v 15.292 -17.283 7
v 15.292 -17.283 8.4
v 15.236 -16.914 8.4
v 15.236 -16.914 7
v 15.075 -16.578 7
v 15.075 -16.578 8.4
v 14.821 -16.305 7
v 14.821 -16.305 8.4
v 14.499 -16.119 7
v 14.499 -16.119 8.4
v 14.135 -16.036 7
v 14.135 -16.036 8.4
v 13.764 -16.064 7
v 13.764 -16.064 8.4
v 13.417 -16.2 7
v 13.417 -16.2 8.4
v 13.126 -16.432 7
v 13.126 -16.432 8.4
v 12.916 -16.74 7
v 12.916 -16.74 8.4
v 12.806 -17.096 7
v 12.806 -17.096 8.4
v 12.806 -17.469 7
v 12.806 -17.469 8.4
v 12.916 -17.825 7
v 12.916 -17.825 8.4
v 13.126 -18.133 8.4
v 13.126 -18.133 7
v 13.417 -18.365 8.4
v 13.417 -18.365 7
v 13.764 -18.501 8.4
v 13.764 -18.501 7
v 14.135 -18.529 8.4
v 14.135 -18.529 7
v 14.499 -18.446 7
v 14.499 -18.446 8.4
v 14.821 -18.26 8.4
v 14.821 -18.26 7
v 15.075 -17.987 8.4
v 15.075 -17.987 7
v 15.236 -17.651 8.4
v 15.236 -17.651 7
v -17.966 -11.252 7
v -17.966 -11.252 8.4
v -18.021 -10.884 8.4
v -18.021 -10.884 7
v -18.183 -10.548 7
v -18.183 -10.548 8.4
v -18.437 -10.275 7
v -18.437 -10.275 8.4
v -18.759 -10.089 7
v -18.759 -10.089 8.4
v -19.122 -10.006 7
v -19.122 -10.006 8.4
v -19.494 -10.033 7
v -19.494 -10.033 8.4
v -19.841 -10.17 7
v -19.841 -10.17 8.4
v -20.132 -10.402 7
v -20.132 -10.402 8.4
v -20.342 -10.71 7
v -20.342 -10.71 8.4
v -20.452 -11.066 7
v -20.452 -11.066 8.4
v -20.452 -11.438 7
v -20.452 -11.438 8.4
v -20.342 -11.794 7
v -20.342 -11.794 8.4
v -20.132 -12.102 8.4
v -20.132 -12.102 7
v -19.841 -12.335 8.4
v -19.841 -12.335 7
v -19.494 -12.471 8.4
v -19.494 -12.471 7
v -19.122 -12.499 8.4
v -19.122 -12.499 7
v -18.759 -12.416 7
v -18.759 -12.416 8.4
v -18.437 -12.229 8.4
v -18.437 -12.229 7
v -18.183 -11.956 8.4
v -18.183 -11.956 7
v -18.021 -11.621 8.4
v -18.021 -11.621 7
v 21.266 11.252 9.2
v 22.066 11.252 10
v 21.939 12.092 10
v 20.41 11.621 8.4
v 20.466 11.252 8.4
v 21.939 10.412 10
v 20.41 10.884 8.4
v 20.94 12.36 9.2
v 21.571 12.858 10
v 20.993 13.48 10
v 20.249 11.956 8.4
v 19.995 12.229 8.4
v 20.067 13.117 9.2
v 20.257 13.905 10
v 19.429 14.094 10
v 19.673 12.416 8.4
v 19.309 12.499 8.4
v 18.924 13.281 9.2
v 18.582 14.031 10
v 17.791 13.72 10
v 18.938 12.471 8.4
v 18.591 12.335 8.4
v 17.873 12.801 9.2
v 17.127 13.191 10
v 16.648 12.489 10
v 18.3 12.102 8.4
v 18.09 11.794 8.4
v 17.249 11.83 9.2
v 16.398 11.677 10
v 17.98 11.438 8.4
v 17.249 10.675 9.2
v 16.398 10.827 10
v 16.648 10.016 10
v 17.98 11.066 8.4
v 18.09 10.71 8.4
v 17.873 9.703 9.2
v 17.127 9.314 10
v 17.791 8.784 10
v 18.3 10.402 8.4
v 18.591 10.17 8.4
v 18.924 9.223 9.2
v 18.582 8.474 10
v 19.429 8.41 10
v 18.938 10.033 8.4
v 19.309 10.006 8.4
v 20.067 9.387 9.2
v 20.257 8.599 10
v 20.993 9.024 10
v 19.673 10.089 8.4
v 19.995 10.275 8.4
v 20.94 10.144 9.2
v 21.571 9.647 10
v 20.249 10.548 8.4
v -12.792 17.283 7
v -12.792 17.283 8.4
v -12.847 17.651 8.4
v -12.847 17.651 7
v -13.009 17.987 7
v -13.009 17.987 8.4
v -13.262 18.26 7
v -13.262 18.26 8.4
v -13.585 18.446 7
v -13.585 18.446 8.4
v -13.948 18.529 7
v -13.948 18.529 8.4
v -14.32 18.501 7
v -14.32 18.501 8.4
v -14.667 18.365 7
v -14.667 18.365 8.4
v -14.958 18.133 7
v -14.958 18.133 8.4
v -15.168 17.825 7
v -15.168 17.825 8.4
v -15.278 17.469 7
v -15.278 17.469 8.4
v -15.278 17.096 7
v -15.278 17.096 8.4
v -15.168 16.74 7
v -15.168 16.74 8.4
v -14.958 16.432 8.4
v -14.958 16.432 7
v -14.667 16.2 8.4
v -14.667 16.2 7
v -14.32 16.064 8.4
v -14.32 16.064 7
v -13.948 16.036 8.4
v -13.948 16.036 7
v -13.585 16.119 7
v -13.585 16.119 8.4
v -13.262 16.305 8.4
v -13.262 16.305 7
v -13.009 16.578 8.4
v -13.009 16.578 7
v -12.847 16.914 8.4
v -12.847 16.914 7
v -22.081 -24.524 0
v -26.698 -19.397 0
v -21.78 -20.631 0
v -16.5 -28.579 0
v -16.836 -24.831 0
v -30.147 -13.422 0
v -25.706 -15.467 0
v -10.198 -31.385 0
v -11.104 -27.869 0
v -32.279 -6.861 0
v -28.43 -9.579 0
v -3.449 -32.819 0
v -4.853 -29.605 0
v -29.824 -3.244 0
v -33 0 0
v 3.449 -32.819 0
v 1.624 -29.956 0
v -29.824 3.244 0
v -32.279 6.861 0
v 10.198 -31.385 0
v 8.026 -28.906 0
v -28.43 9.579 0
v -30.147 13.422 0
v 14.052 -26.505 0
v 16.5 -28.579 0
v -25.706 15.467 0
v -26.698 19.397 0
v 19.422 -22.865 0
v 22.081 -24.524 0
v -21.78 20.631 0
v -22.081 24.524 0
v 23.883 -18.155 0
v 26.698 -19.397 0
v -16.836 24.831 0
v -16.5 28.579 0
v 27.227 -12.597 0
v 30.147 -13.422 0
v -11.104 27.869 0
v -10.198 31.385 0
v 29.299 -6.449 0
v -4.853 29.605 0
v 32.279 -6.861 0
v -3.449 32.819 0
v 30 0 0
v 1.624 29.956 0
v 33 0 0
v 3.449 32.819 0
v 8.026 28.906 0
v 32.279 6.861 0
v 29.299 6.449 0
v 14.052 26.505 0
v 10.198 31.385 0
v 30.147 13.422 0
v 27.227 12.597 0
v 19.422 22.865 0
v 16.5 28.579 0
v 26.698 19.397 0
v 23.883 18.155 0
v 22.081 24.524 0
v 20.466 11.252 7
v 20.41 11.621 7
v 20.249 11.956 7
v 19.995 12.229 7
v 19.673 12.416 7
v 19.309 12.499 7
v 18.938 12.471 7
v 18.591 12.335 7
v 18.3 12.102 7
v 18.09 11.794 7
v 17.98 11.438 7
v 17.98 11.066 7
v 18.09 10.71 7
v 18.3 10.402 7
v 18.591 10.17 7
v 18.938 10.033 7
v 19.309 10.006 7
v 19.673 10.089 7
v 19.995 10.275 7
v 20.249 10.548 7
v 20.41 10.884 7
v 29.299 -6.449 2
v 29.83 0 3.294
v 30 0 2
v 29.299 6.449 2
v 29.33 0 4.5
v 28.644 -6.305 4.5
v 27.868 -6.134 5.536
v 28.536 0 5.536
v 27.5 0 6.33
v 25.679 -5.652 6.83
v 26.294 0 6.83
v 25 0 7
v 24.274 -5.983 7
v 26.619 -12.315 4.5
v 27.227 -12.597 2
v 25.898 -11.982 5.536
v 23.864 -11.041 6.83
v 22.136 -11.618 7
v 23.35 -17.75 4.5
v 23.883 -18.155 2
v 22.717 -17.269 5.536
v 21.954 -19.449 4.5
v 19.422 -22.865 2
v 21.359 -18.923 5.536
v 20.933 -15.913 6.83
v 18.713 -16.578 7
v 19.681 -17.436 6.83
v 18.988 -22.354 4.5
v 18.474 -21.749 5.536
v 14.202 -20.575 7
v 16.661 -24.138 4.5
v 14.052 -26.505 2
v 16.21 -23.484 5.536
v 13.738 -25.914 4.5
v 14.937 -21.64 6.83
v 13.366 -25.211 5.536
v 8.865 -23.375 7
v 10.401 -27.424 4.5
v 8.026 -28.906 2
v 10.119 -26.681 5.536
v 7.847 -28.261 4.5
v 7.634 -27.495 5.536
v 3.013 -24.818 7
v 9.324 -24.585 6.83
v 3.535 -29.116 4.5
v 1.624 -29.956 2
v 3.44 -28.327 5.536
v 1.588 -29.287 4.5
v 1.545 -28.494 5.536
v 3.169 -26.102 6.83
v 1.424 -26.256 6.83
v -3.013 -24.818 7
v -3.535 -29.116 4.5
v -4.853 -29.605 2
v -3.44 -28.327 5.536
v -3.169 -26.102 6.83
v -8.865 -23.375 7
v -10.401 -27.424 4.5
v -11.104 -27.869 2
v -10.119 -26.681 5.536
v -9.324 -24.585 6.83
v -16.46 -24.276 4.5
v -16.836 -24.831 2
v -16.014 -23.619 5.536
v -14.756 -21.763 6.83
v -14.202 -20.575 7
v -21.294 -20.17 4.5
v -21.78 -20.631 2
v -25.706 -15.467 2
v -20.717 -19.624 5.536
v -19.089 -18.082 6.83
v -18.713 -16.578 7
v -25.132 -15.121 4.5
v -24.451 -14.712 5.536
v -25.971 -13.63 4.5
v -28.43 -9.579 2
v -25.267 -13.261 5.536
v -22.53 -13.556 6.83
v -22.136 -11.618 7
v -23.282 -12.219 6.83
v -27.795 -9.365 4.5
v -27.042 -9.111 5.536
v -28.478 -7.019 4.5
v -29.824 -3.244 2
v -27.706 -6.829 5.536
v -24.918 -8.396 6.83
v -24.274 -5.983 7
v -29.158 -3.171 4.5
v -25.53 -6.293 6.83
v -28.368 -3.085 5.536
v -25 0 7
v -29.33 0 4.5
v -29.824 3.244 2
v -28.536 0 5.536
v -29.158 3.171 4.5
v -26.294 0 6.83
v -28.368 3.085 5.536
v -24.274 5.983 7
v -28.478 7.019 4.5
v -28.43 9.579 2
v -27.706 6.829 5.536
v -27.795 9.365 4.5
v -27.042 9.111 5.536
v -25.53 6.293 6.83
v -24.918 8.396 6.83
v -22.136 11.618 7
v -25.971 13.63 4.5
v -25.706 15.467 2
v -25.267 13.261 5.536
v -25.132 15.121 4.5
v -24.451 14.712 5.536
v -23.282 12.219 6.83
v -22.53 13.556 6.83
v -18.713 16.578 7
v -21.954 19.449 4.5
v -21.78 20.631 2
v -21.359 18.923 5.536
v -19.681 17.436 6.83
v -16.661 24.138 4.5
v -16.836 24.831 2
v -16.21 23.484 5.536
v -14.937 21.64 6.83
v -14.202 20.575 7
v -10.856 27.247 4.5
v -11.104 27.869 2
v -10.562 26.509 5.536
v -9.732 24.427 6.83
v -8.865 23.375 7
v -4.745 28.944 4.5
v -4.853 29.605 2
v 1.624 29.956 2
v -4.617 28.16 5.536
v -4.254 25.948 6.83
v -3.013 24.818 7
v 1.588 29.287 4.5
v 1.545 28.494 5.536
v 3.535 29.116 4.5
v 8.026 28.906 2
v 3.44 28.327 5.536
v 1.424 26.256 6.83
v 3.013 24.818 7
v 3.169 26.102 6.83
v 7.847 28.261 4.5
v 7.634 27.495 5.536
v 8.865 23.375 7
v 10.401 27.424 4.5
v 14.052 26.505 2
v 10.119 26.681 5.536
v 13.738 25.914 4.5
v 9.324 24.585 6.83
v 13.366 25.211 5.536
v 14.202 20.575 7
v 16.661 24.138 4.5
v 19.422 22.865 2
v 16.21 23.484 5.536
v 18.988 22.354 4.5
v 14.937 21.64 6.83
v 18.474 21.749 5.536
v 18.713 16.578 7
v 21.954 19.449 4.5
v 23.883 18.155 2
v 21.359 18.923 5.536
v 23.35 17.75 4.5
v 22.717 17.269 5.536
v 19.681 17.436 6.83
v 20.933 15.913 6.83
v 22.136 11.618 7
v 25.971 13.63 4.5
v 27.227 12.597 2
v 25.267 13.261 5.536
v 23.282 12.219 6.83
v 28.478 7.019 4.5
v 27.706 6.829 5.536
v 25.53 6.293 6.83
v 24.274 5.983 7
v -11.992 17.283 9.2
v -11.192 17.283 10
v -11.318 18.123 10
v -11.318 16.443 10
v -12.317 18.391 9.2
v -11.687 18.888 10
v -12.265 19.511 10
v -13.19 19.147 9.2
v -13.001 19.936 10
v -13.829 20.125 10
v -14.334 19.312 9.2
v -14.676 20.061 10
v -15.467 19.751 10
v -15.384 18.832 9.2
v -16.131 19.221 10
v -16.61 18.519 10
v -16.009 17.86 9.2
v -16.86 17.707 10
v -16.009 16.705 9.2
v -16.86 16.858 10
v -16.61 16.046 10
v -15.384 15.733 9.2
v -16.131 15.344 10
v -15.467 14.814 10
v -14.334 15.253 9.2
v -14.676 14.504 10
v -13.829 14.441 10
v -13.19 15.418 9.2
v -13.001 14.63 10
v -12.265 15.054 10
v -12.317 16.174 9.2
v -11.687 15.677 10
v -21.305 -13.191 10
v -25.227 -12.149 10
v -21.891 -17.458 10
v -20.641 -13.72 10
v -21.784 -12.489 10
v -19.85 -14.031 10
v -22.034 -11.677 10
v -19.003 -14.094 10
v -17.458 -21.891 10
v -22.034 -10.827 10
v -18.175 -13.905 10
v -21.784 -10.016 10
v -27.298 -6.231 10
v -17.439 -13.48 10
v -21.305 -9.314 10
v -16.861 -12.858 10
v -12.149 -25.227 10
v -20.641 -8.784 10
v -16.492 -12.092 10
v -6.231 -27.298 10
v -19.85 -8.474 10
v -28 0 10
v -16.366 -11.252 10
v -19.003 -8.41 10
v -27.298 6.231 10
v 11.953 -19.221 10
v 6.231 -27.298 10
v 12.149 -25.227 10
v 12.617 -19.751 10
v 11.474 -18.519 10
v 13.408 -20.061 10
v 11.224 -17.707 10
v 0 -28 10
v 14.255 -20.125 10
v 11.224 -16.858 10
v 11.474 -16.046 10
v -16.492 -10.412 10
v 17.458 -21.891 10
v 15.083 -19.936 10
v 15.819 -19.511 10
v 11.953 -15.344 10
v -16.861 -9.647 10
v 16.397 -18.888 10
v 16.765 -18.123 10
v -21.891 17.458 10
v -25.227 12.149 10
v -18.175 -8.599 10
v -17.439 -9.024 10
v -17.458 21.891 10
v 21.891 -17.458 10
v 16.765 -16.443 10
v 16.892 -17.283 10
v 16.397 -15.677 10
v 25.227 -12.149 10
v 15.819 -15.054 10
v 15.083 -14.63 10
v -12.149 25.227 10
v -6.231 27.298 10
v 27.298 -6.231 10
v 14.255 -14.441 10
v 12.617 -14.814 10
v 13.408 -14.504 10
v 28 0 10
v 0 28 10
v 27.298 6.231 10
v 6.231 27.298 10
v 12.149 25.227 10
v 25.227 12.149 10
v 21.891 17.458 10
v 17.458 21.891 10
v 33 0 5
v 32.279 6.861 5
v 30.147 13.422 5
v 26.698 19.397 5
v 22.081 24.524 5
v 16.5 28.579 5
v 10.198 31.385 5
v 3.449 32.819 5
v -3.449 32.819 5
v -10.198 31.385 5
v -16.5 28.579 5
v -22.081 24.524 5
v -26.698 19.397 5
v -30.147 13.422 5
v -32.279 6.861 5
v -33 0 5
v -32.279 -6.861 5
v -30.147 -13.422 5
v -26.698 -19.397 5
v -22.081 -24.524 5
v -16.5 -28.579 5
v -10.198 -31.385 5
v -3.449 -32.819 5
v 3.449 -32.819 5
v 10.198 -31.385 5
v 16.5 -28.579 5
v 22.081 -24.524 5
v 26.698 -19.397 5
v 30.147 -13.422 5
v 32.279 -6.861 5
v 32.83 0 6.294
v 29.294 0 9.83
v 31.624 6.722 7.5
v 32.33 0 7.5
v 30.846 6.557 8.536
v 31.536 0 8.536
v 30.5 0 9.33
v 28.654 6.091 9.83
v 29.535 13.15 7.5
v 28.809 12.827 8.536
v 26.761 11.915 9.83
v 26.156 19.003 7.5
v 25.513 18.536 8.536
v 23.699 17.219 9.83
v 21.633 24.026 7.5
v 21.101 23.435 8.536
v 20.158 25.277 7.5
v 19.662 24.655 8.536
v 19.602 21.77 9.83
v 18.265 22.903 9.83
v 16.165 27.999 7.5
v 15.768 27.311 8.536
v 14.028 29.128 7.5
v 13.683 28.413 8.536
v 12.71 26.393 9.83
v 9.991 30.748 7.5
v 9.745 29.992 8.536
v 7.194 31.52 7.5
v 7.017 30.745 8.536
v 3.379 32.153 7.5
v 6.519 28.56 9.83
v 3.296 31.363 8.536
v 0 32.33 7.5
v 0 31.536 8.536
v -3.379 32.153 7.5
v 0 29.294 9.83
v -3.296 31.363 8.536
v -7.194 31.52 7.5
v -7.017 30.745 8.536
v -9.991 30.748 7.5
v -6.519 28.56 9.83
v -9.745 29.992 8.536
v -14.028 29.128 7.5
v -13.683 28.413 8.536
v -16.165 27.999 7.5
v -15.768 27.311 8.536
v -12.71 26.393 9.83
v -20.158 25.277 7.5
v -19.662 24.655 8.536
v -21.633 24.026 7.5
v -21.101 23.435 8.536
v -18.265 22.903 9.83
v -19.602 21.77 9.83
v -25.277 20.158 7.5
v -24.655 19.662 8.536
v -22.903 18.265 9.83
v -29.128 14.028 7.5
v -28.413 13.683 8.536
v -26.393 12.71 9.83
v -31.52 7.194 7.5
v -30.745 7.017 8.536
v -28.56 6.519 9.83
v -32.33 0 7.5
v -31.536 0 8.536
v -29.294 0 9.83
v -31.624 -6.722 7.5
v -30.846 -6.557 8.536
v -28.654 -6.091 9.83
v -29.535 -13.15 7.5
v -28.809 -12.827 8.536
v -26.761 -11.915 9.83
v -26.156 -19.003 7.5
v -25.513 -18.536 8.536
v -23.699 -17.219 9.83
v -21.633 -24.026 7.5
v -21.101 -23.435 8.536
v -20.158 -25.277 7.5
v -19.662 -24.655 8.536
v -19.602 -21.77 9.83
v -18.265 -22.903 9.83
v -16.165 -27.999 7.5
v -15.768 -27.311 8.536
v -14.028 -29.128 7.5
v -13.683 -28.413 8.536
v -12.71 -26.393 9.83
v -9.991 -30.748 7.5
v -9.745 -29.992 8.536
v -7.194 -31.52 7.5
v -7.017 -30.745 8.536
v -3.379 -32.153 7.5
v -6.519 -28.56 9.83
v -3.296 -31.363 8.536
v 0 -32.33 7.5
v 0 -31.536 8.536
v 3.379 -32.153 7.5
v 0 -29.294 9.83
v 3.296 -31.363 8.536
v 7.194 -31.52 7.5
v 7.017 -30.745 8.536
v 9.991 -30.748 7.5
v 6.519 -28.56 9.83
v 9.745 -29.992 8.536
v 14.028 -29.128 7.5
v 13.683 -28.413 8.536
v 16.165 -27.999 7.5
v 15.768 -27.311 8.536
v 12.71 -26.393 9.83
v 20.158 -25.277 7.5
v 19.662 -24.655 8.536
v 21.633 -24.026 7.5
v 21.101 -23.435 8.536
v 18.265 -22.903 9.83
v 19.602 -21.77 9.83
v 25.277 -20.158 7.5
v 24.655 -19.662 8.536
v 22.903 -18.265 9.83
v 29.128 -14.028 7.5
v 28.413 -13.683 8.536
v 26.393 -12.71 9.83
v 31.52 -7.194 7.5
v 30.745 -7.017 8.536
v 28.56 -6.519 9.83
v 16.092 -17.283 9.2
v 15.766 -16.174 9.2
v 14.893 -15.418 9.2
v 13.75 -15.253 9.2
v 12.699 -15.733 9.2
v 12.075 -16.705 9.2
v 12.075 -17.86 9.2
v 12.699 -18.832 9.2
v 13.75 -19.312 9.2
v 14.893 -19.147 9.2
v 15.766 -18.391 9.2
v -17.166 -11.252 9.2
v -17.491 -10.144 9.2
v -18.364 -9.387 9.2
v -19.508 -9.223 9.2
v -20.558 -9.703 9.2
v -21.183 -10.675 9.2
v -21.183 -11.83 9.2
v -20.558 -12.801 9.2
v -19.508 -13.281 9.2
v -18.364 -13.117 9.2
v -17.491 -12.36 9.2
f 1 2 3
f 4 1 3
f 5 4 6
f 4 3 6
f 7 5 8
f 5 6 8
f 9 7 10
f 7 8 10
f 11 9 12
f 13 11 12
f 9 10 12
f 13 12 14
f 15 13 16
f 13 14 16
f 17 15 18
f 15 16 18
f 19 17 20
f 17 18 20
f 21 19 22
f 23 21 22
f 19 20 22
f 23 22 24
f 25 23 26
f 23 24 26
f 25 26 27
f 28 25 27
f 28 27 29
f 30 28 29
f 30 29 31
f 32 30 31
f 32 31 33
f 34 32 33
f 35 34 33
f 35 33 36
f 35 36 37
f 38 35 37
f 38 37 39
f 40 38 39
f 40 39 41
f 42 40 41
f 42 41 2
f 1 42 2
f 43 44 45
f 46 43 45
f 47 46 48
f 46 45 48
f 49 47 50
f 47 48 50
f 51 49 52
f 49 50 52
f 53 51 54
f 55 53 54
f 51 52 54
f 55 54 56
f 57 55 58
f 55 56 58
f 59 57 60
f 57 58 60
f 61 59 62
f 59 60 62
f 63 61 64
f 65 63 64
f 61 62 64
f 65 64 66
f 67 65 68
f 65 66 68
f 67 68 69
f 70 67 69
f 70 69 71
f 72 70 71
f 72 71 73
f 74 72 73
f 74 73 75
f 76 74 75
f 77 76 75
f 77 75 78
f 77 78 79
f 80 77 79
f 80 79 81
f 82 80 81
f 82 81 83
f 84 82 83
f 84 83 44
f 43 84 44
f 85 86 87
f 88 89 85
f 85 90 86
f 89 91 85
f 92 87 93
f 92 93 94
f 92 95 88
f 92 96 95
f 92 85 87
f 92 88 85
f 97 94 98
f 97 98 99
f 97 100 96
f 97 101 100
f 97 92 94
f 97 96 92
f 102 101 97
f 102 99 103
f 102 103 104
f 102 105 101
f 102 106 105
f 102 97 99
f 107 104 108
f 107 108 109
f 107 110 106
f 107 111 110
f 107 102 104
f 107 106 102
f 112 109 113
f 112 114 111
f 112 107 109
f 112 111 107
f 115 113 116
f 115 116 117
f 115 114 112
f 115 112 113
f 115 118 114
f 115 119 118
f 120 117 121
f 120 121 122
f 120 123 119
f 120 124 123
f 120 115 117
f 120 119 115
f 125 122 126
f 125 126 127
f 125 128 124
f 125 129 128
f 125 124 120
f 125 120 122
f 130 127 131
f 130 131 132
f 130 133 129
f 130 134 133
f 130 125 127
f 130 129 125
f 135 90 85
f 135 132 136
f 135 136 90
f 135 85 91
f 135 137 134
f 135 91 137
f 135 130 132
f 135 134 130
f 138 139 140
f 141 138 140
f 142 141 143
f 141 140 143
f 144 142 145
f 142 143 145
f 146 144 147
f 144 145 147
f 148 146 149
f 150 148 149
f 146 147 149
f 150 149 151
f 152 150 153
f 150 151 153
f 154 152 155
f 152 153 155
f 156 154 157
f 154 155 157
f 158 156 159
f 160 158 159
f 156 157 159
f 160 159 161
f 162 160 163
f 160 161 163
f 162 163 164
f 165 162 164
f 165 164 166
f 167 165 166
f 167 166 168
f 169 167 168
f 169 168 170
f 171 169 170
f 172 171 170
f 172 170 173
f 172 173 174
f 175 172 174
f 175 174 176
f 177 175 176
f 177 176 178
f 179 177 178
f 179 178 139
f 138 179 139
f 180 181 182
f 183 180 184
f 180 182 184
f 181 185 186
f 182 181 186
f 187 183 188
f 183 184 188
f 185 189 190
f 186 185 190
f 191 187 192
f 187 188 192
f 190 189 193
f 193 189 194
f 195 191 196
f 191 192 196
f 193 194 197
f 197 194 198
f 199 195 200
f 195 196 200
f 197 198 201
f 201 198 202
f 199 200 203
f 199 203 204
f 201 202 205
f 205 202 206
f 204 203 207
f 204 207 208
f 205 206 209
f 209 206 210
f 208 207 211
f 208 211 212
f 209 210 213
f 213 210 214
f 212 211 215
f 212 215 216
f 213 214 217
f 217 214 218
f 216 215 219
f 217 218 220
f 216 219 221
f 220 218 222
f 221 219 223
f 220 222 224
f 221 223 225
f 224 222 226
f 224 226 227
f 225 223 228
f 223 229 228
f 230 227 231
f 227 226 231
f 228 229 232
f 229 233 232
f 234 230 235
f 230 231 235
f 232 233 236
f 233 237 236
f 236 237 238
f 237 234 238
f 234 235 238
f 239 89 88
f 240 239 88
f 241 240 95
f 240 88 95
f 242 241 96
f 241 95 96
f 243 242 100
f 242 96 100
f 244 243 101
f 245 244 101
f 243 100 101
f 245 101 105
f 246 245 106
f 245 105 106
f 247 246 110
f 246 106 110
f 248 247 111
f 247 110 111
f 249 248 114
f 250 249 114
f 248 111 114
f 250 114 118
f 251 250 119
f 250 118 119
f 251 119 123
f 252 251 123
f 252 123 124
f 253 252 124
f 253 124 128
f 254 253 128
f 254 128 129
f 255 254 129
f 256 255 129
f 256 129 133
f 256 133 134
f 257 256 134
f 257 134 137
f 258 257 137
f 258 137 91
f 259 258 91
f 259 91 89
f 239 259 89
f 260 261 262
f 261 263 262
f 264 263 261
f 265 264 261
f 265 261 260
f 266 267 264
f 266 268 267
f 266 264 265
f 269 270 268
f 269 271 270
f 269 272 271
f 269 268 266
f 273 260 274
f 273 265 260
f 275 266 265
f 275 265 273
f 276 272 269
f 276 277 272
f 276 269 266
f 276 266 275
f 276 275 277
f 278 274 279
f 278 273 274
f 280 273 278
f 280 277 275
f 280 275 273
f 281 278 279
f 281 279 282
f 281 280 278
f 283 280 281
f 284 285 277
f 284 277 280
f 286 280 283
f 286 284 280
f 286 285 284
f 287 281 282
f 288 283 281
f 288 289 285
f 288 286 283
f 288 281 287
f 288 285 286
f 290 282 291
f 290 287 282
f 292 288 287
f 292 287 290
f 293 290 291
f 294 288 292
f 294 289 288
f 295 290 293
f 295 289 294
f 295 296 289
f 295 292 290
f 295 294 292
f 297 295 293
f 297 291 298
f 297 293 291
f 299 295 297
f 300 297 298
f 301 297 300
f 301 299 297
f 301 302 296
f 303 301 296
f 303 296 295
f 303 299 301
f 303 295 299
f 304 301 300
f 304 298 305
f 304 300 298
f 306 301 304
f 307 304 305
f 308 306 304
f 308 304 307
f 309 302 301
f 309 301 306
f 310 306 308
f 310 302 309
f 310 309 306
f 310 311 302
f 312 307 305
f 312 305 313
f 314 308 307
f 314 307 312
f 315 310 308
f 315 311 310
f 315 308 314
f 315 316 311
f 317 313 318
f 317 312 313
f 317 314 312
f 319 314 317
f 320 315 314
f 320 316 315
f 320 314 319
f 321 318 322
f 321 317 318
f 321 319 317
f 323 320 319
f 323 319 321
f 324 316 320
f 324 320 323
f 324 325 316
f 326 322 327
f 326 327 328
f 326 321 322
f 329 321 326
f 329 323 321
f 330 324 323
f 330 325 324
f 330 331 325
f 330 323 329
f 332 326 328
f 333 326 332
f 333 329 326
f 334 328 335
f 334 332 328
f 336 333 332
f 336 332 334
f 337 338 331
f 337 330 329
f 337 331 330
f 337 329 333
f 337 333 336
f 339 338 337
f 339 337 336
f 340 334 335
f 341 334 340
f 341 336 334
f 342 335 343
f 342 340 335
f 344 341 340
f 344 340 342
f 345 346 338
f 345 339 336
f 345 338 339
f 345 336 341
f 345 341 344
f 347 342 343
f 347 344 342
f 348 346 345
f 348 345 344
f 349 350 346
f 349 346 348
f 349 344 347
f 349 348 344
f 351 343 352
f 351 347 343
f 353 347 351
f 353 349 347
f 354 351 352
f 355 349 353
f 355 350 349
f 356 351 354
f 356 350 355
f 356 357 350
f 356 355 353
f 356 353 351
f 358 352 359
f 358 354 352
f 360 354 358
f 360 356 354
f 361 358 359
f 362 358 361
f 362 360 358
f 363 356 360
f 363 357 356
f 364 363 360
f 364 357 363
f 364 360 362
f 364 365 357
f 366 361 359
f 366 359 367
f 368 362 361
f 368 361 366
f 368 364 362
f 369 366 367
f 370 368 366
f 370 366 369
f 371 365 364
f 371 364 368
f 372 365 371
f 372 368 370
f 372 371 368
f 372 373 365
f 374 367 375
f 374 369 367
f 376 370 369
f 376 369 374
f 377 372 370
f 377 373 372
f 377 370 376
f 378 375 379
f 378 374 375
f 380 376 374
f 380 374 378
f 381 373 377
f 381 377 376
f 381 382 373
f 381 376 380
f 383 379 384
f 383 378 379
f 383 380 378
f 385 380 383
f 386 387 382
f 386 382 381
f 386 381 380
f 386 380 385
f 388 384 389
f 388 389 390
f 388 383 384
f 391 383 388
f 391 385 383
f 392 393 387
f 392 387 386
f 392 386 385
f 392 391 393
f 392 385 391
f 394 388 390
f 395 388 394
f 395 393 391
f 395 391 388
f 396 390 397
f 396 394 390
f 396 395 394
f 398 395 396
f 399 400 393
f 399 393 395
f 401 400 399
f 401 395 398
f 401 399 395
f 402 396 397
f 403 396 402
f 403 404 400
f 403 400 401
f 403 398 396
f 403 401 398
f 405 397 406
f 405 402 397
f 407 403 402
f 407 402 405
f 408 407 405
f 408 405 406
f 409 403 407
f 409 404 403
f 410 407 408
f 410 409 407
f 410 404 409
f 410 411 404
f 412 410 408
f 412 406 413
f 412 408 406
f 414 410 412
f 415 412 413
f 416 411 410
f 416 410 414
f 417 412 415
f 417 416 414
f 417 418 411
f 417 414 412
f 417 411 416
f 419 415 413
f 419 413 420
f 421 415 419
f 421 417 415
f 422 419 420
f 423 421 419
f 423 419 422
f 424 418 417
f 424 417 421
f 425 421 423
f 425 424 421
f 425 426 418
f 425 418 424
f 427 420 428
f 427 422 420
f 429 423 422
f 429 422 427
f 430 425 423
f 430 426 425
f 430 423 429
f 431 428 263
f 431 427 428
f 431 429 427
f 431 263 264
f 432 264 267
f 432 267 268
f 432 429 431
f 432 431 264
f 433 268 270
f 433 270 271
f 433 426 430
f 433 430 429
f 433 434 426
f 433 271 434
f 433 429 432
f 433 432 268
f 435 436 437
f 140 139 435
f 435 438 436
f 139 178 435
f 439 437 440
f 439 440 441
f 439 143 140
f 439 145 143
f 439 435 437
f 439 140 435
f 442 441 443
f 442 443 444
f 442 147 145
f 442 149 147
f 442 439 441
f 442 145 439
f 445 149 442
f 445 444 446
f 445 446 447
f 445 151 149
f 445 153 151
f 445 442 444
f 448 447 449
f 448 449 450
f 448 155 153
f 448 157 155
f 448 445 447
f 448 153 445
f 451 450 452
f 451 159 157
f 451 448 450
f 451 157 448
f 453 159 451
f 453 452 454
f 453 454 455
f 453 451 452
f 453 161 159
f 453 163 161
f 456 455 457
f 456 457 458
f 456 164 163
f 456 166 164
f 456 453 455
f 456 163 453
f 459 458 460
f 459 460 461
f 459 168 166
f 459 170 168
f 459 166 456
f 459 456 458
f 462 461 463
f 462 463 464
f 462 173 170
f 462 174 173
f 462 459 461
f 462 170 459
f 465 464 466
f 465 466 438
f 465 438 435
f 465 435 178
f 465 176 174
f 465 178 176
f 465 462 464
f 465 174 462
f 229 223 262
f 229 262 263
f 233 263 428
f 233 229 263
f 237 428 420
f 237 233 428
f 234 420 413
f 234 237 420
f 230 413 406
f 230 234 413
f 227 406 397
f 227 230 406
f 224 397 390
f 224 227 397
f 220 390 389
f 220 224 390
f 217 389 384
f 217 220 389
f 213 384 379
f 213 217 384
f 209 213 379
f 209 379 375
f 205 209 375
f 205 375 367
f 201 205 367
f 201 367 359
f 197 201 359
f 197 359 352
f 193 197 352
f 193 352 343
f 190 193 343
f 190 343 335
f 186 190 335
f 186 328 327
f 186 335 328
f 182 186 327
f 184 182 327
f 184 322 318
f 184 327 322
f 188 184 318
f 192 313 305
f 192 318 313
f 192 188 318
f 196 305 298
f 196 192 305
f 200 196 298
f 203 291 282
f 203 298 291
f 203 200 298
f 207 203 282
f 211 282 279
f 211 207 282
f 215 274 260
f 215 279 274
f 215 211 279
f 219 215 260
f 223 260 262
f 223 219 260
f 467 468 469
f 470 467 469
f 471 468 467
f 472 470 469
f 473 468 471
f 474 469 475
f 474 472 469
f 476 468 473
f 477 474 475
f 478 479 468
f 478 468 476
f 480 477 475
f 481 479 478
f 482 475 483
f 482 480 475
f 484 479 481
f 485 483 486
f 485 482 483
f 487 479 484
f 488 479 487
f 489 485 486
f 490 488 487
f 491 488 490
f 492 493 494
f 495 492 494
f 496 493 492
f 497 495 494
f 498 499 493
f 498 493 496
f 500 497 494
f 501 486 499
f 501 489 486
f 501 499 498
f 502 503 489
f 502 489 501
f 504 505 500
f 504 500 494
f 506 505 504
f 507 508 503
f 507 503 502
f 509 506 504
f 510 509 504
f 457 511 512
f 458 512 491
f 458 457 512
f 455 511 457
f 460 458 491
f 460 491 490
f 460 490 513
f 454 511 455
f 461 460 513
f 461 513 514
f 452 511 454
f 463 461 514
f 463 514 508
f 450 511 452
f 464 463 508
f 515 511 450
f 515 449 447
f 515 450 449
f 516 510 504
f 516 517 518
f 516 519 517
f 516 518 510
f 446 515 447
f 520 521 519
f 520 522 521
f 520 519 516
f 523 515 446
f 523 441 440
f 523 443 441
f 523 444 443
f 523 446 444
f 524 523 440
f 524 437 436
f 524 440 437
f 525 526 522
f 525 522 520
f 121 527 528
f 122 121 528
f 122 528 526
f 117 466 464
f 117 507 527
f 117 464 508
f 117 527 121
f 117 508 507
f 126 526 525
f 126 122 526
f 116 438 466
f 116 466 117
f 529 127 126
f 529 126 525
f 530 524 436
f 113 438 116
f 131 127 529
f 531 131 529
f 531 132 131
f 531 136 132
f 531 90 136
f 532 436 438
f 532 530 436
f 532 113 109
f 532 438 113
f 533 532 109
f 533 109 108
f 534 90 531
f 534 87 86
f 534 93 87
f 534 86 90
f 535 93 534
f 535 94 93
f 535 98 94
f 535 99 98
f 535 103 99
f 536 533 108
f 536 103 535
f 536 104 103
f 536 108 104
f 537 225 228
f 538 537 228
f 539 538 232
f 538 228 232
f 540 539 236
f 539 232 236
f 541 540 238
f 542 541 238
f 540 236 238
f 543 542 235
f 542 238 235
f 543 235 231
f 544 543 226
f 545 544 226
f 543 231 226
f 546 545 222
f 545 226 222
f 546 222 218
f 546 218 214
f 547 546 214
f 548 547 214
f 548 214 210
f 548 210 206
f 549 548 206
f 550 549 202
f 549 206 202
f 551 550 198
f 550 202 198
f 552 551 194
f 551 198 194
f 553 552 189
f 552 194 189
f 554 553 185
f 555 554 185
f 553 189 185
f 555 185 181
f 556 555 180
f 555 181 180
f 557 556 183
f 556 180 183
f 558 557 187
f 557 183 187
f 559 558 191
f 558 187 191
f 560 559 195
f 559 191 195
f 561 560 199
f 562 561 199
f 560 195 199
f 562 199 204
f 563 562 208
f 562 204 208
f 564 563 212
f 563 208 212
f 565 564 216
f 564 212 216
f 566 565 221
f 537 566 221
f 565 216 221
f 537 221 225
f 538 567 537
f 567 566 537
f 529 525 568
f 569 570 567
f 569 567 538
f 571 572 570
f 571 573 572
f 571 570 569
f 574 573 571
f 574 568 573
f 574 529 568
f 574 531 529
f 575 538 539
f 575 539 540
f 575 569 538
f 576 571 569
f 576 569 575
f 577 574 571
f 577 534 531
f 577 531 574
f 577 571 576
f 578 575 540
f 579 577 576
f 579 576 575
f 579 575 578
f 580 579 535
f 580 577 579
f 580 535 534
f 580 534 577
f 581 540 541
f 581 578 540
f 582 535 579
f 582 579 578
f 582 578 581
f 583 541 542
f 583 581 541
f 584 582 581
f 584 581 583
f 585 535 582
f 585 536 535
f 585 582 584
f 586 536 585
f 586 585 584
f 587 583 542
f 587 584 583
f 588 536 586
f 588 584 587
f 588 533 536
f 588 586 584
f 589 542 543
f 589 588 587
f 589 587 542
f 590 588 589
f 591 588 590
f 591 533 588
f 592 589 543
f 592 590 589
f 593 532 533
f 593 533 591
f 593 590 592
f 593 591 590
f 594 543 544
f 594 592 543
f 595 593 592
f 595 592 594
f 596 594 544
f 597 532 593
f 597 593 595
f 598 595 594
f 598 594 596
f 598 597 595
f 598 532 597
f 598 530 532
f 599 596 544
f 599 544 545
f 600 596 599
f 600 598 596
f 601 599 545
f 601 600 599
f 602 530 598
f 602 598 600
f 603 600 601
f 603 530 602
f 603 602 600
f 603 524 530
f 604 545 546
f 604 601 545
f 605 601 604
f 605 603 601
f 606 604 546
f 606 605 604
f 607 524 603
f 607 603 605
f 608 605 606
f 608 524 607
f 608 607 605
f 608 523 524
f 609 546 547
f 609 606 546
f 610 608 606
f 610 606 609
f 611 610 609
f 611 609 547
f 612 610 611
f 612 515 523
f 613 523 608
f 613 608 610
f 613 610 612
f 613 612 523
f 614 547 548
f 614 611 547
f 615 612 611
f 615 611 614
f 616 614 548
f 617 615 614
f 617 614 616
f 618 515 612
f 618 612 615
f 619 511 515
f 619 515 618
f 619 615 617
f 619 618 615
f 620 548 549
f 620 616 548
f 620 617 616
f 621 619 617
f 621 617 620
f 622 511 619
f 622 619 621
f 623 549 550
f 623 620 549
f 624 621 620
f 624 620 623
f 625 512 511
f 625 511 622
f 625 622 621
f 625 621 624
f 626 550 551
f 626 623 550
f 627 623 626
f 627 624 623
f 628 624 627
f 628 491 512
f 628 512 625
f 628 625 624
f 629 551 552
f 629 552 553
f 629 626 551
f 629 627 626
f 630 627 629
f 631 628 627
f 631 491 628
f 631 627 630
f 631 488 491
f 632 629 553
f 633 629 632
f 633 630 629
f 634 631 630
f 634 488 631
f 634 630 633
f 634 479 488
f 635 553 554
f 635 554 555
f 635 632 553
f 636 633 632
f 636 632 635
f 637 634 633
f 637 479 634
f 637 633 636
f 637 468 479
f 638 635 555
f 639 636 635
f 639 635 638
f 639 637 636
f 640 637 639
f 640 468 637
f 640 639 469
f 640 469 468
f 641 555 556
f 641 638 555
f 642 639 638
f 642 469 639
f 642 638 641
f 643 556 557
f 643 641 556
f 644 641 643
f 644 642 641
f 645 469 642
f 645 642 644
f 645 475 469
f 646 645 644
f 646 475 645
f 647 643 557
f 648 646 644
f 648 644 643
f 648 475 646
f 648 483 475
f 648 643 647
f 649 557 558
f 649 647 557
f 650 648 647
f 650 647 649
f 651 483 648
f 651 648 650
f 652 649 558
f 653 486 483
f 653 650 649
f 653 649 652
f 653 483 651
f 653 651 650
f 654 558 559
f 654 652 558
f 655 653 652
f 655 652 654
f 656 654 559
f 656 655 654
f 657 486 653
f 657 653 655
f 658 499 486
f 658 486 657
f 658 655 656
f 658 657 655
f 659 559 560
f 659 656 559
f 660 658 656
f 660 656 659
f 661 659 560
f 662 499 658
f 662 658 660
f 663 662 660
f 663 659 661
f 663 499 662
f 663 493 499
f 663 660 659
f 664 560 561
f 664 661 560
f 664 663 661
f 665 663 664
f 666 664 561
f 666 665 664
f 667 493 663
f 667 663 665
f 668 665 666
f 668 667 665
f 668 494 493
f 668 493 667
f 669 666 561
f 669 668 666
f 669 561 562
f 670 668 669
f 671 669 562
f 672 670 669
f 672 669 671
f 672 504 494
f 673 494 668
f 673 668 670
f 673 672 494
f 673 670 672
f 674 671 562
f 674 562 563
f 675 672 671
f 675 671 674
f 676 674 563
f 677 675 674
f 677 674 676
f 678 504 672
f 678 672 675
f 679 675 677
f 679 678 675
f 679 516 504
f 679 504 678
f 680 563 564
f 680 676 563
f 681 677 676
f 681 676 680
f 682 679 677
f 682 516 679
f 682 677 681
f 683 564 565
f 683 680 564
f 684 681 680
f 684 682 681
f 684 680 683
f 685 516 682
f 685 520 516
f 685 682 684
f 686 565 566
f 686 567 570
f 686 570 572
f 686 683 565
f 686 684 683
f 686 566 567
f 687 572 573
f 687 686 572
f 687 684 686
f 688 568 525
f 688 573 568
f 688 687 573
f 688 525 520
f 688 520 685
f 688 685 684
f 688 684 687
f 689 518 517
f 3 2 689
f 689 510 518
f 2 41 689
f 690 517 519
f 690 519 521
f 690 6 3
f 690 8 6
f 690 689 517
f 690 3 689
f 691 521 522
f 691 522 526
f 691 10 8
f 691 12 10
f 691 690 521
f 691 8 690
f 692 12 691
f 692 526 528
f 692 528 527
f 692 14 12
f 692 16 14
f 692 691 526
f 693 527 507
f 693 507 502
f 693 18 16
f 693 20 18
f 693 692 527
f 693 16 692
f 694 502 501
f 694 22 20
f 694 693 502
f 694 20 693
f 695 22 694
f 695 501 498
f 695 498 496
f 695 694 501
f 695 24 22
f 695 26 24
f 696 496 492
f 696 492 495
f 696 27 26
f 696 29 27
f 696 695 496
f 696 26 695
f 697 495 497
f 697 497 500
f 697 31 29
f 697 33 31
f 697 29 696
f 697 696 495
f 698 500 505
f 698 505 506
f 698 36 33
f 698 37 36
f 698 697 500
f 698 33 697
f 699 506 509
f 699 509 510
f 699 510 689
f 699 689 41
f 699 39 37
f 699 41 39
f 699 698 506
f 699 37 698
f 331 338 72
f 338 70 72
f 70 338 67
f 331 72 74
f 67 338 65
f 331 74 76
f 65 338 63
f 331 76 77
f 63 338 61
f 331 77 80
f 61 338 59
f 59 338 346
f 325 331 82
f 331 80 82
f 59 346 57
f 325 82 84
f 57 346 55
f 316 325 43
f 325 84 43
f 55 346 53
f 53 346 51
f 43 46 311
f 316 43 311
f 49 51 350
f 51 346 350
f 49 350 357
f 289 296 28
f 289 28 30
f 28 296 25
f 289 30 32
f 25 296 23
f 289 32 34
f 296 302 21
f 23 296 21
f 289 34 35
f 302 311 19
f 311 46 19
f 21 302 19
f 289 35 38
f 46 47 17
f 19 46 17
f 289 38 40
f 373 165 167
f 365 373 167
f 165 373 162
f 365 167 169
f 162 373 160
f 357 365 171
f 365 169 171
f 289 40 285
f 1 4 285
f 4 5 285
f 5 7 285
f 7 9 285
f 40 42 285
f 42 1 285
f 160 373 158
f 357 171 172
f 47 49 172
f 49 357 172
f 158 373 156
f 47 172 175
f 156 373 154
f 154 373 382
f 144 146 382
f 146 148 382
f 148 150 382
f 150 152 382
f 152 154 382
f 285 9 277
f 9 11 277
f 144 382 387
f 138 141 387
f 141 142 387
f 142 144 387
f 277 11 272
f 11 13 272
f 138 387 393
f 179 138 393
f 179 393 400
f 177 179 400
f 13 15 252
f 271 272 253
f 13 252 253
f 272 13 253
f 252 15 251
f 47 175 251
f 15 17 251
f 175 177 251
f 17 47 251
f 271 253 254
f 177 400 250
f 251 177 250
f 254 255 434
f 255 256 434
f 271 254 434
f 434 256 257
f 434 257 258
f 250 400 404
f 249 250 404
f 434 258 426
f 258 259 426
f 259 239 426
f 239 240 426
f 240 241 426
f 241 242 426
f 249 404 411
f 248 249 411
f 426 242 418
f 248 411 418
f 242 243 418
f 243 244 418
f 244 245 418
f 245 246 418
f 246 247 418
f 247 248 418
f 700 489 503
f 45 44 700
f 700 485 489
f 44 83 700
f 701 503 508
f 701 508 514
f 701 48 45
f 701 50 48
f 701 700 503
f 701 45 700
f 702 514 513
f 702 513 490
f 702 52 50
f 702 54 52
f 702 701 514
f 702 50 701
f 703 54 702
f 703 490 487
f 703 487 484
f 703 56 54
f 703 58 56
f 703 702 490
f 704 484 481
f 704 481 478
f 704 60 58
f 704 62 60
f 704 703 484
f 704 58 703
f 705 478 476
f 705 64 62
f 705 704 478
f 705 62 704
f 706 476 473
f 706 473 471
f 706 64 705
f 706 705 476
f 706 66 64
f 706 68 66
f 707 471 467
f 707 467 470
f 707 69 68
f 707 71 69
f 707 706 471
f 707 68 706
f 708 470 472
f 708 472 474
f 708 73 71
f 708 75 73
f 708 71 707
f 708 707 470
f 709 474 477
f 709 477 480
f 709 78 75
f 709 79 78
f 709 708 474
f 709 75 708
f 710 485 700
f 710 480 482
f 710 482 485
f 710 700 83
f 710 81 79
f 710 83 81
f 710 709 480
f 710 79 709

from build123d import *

# Parameters (mm, degrees)
CROQUIS1_R              = 33
SALIENTE_EXTRUIR1_DEPTH = 10
VACIADO1_T              = -3
REDONDEO1_R             = 5
CORTAR_EXTRUIR1_REACH   = 49.728
CROQUIS2_R              = 1.25
CHAFL_N1_SIZE           = 1.6


with BuildPart() as part:
    # Croquis1 → Saliente-Extruir1 (new body)
    with BuildSketch(Plane.XY):
        Circle(CROQUIS1_R)
    extrude(amount=SALIENTE_EXTRUIR1_DEPTH)

    # Vaciado1
    vaciado1_openings = [part.faces().sort_by_distance(p)[0] for p in [
        (0, 0, 0),
    ]]
    offset(amount=VACIADO1_T, openings=vaciado1_openings, kind=Kind.INTERSECTION)

    # Redondeo1
    redondeo1_edges = [part.edges().sort_by_distance(p)[0] for p in [
        (-33, 0, 10),
        (-30, 0, 7),
    ]]
    fillet(redondeo1_edges, radius=REDONDEO1_R)

    # Croquis2 → Cortar-Extruir1 (cut, up to next)
    with BuildSketch(Plane.XY.offset(10), mode=Mode.PRIVATE) as cortar_extruir1_sk1:
        with Locations((14.041823927, -17.282568698)):
            Circle(CROQUIS2_R)
    cortar_extruir1_tool1 = extrude(cortar_extruir1_sk1.sketch, amount=-CORTAR_EXTRUIR1_REACH, mode=Mode.PRIVATE) & part.part
    # Croquis2 → Cortar-Extruir1 (cut, up to next)
    with BuildSketch(Plane.XY.offset(10), mode=Mode.PRIVATE) as cortar_extruir1_sk2:
        with Locations((19.215864901, 11.252134735)):
            Circle(CROQUIS2_R)
    cortar_extruir1_tool2 = extrude(cortar_extruir1_sk2.sketch, amount=-CORTAR_EXTRUIR1_REACH, mode=Mode.PRIVATE) & part.part
    # Croquis2 → Cortar-Extruir1 (cut, up to next)
    with BuildSketch(Plane.XY.offset(10), mode=Mode.PRIVATE) as cortar_extruir1_sk3:
        with Locations((-19.215864901, -11.252134735)):
            Circle(CROQUIS2_R)
    cortar_extruir1_tool3 = extrude(cortar_extruir1_sk3.sketch, amount=-CORTAR_EXTRUIR1_REACH, mode=Mode.PRIVATE) & part.part
    # Croquis2 → Cortar-Extruir1 (cut, up to next)
    with BuildSketch(Plane.XY.offset(10), mode=Mode.PRIVATE) as cortar_extruir1_sk4:
        with Locations((-14.041823927, 17.282568698)):
            Circle(CROQUIS2_R)
    cortar_extruir1_tool4 = extrude(cortar_extruir1_sk4.sketch, amount=-CORTAR_EXTRUIR1_REACH, mode=Mode.PRIVATE) & part.part
    add(cortar_extruir1_tool1.solids().sort_by_distance((14.041824, -17.282569, 10))[0], mode=Mode.SUBTRACT)
    add(cortar_extruir1_tool2.solids().sort_by_distance((19.215865, 11.252135, 10))[0], mode=Mode.SUBTRACT)
    add(cortar_extruir1_tool3.solids().sort_by_distance((-19.215865, -11.252135, 10))[0], mode=Mode.SUBTRACT)
    add(cortar_extruir1_tool4.solids().sort_by_distance((-14.041824, 17.282569, 10))[0], mode=Mode.SUBTRACT)

    # Chaflán1
    chafl_n1_edges = [part.edges().sort_by_distance(p)[0] for p in [
        (12.791823927, -17.282568698, 10),
        (17.965864901, 11.252134735, 10),
        (-20.465864901, -11.252134735, 10),
        (-15.291823927, 17.282568698, 10),
    ]]
    chamfer(chafl_n1_edges, length=CHAFL_N1_SIZE)


solid = part.part
